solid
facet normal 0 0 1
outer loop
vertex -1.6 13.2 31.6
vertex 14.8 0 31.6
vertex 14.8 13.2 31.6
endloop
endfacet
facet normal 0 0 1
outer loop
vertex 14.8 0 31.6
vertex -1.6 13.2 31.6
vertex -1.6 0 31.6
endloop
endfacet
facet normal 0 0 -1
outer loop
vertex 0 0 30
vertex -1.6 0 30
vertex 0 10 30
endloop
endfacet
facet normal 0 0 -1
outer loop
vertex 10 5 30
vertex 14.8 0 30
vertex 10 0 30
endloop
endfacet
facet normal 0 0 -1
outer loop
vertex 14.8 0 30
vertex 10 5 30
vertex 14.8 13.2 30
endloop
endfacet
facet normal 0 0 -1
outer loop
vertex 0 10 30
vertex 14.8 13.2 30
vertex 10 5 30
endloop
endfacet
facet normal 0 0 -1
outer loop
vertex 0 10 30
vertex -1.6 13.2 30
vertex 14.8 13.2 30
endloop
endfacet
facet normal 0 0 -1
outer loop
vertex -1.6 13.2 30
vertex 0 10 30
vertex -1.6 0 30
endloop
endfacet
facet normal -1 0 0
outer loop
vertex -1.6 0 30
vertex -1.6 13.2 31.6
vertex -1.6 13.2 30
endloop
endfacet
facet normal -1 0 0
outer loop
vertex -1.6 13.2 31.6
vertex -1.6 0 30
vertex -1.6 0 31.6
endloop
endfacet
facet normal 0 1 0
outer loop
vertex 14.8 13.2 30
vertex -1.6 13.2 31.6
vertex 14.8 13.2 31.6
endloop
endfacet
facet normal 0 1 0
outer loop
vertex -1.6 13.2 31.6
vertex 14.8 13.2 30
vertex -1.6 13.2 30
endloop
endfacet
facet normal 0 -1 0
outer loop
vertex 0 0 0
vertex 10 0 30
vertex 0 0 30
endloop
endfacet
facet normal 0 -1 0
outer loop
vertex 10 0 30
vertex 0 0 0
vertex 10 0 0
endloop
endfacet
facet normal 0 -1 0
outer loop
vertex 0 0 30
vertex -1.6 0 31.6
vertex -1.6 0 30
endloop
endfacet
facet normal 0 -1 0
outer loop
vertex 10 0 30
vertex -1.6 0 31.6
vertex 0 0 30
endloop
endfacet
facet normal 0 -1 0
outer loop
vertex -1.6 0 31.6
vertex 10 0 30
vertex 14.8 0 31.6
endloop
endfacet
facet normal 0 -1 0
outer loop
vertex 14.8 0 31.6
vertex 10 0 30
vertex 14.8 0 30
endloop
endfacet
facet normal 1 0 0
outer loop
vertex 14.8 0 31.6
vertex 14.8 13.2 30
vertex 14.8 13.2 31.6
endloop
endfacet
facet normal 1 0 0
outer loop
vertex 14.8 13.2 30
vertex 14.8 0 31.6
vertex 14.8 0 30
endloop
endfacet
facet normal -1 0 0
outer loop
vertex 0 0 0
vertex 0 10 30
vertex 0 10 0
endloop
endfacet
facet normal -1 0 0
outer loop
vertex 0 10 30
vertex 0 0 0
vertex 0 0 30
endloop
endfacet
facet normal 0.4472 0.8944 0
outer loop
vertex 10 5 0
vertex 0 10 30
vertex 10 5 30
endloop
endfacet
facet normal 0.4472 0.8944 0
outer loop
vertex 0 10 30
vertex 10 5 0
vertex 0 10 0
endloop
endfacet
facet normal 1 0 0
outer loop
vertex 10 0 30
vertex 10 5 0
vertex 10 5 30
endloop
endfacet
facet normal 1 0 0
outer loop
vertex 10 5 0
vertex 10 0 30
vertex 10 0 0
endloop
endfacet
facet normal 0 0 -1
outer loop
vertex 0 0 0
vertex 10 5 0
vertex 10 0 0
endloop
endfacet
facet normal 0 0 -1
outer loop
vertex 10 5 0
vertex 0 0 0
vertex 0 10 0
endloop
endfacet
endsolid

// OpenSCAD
// Dimensions in mm
outer_diameter_spout = 10;
inner_bore_spout = outer_diameter_spout - 2 * 1.6; // 6.8 mm
height_cone = 30;
wall_thickness = 1.6;

// Spout
translate([0, 0, 0]) 
    linear_extrude(height = height_cone) 
        polygon(points=[[0, 0], [outer_diameter_spout, 0], [outer_diameter_spout, outer_diameter_spout/2], [0, outer_diameter_spout]]);

// Cone
translate([0, 0, height_cone]) 
    rotate_extrude(height = height_cone - 30) 
        polygon(points=[[0, 0], [outer_diameter_spout, 0], [outer_diameter_spout + (60-outer_diameter_spout)/2 * sqrt(3), outer_diameter_spout/2]]); 

// Wall
translate([0, 0, height_cone]) 
    for (x = [-1.6, 1.6]) 
        translate([x, 0, 0])
            cube(size=[outer_diameter_spout + 2 * wall_thickness, outer_diameter_spout + 2 * wall_thickness, wall_thickness]);
